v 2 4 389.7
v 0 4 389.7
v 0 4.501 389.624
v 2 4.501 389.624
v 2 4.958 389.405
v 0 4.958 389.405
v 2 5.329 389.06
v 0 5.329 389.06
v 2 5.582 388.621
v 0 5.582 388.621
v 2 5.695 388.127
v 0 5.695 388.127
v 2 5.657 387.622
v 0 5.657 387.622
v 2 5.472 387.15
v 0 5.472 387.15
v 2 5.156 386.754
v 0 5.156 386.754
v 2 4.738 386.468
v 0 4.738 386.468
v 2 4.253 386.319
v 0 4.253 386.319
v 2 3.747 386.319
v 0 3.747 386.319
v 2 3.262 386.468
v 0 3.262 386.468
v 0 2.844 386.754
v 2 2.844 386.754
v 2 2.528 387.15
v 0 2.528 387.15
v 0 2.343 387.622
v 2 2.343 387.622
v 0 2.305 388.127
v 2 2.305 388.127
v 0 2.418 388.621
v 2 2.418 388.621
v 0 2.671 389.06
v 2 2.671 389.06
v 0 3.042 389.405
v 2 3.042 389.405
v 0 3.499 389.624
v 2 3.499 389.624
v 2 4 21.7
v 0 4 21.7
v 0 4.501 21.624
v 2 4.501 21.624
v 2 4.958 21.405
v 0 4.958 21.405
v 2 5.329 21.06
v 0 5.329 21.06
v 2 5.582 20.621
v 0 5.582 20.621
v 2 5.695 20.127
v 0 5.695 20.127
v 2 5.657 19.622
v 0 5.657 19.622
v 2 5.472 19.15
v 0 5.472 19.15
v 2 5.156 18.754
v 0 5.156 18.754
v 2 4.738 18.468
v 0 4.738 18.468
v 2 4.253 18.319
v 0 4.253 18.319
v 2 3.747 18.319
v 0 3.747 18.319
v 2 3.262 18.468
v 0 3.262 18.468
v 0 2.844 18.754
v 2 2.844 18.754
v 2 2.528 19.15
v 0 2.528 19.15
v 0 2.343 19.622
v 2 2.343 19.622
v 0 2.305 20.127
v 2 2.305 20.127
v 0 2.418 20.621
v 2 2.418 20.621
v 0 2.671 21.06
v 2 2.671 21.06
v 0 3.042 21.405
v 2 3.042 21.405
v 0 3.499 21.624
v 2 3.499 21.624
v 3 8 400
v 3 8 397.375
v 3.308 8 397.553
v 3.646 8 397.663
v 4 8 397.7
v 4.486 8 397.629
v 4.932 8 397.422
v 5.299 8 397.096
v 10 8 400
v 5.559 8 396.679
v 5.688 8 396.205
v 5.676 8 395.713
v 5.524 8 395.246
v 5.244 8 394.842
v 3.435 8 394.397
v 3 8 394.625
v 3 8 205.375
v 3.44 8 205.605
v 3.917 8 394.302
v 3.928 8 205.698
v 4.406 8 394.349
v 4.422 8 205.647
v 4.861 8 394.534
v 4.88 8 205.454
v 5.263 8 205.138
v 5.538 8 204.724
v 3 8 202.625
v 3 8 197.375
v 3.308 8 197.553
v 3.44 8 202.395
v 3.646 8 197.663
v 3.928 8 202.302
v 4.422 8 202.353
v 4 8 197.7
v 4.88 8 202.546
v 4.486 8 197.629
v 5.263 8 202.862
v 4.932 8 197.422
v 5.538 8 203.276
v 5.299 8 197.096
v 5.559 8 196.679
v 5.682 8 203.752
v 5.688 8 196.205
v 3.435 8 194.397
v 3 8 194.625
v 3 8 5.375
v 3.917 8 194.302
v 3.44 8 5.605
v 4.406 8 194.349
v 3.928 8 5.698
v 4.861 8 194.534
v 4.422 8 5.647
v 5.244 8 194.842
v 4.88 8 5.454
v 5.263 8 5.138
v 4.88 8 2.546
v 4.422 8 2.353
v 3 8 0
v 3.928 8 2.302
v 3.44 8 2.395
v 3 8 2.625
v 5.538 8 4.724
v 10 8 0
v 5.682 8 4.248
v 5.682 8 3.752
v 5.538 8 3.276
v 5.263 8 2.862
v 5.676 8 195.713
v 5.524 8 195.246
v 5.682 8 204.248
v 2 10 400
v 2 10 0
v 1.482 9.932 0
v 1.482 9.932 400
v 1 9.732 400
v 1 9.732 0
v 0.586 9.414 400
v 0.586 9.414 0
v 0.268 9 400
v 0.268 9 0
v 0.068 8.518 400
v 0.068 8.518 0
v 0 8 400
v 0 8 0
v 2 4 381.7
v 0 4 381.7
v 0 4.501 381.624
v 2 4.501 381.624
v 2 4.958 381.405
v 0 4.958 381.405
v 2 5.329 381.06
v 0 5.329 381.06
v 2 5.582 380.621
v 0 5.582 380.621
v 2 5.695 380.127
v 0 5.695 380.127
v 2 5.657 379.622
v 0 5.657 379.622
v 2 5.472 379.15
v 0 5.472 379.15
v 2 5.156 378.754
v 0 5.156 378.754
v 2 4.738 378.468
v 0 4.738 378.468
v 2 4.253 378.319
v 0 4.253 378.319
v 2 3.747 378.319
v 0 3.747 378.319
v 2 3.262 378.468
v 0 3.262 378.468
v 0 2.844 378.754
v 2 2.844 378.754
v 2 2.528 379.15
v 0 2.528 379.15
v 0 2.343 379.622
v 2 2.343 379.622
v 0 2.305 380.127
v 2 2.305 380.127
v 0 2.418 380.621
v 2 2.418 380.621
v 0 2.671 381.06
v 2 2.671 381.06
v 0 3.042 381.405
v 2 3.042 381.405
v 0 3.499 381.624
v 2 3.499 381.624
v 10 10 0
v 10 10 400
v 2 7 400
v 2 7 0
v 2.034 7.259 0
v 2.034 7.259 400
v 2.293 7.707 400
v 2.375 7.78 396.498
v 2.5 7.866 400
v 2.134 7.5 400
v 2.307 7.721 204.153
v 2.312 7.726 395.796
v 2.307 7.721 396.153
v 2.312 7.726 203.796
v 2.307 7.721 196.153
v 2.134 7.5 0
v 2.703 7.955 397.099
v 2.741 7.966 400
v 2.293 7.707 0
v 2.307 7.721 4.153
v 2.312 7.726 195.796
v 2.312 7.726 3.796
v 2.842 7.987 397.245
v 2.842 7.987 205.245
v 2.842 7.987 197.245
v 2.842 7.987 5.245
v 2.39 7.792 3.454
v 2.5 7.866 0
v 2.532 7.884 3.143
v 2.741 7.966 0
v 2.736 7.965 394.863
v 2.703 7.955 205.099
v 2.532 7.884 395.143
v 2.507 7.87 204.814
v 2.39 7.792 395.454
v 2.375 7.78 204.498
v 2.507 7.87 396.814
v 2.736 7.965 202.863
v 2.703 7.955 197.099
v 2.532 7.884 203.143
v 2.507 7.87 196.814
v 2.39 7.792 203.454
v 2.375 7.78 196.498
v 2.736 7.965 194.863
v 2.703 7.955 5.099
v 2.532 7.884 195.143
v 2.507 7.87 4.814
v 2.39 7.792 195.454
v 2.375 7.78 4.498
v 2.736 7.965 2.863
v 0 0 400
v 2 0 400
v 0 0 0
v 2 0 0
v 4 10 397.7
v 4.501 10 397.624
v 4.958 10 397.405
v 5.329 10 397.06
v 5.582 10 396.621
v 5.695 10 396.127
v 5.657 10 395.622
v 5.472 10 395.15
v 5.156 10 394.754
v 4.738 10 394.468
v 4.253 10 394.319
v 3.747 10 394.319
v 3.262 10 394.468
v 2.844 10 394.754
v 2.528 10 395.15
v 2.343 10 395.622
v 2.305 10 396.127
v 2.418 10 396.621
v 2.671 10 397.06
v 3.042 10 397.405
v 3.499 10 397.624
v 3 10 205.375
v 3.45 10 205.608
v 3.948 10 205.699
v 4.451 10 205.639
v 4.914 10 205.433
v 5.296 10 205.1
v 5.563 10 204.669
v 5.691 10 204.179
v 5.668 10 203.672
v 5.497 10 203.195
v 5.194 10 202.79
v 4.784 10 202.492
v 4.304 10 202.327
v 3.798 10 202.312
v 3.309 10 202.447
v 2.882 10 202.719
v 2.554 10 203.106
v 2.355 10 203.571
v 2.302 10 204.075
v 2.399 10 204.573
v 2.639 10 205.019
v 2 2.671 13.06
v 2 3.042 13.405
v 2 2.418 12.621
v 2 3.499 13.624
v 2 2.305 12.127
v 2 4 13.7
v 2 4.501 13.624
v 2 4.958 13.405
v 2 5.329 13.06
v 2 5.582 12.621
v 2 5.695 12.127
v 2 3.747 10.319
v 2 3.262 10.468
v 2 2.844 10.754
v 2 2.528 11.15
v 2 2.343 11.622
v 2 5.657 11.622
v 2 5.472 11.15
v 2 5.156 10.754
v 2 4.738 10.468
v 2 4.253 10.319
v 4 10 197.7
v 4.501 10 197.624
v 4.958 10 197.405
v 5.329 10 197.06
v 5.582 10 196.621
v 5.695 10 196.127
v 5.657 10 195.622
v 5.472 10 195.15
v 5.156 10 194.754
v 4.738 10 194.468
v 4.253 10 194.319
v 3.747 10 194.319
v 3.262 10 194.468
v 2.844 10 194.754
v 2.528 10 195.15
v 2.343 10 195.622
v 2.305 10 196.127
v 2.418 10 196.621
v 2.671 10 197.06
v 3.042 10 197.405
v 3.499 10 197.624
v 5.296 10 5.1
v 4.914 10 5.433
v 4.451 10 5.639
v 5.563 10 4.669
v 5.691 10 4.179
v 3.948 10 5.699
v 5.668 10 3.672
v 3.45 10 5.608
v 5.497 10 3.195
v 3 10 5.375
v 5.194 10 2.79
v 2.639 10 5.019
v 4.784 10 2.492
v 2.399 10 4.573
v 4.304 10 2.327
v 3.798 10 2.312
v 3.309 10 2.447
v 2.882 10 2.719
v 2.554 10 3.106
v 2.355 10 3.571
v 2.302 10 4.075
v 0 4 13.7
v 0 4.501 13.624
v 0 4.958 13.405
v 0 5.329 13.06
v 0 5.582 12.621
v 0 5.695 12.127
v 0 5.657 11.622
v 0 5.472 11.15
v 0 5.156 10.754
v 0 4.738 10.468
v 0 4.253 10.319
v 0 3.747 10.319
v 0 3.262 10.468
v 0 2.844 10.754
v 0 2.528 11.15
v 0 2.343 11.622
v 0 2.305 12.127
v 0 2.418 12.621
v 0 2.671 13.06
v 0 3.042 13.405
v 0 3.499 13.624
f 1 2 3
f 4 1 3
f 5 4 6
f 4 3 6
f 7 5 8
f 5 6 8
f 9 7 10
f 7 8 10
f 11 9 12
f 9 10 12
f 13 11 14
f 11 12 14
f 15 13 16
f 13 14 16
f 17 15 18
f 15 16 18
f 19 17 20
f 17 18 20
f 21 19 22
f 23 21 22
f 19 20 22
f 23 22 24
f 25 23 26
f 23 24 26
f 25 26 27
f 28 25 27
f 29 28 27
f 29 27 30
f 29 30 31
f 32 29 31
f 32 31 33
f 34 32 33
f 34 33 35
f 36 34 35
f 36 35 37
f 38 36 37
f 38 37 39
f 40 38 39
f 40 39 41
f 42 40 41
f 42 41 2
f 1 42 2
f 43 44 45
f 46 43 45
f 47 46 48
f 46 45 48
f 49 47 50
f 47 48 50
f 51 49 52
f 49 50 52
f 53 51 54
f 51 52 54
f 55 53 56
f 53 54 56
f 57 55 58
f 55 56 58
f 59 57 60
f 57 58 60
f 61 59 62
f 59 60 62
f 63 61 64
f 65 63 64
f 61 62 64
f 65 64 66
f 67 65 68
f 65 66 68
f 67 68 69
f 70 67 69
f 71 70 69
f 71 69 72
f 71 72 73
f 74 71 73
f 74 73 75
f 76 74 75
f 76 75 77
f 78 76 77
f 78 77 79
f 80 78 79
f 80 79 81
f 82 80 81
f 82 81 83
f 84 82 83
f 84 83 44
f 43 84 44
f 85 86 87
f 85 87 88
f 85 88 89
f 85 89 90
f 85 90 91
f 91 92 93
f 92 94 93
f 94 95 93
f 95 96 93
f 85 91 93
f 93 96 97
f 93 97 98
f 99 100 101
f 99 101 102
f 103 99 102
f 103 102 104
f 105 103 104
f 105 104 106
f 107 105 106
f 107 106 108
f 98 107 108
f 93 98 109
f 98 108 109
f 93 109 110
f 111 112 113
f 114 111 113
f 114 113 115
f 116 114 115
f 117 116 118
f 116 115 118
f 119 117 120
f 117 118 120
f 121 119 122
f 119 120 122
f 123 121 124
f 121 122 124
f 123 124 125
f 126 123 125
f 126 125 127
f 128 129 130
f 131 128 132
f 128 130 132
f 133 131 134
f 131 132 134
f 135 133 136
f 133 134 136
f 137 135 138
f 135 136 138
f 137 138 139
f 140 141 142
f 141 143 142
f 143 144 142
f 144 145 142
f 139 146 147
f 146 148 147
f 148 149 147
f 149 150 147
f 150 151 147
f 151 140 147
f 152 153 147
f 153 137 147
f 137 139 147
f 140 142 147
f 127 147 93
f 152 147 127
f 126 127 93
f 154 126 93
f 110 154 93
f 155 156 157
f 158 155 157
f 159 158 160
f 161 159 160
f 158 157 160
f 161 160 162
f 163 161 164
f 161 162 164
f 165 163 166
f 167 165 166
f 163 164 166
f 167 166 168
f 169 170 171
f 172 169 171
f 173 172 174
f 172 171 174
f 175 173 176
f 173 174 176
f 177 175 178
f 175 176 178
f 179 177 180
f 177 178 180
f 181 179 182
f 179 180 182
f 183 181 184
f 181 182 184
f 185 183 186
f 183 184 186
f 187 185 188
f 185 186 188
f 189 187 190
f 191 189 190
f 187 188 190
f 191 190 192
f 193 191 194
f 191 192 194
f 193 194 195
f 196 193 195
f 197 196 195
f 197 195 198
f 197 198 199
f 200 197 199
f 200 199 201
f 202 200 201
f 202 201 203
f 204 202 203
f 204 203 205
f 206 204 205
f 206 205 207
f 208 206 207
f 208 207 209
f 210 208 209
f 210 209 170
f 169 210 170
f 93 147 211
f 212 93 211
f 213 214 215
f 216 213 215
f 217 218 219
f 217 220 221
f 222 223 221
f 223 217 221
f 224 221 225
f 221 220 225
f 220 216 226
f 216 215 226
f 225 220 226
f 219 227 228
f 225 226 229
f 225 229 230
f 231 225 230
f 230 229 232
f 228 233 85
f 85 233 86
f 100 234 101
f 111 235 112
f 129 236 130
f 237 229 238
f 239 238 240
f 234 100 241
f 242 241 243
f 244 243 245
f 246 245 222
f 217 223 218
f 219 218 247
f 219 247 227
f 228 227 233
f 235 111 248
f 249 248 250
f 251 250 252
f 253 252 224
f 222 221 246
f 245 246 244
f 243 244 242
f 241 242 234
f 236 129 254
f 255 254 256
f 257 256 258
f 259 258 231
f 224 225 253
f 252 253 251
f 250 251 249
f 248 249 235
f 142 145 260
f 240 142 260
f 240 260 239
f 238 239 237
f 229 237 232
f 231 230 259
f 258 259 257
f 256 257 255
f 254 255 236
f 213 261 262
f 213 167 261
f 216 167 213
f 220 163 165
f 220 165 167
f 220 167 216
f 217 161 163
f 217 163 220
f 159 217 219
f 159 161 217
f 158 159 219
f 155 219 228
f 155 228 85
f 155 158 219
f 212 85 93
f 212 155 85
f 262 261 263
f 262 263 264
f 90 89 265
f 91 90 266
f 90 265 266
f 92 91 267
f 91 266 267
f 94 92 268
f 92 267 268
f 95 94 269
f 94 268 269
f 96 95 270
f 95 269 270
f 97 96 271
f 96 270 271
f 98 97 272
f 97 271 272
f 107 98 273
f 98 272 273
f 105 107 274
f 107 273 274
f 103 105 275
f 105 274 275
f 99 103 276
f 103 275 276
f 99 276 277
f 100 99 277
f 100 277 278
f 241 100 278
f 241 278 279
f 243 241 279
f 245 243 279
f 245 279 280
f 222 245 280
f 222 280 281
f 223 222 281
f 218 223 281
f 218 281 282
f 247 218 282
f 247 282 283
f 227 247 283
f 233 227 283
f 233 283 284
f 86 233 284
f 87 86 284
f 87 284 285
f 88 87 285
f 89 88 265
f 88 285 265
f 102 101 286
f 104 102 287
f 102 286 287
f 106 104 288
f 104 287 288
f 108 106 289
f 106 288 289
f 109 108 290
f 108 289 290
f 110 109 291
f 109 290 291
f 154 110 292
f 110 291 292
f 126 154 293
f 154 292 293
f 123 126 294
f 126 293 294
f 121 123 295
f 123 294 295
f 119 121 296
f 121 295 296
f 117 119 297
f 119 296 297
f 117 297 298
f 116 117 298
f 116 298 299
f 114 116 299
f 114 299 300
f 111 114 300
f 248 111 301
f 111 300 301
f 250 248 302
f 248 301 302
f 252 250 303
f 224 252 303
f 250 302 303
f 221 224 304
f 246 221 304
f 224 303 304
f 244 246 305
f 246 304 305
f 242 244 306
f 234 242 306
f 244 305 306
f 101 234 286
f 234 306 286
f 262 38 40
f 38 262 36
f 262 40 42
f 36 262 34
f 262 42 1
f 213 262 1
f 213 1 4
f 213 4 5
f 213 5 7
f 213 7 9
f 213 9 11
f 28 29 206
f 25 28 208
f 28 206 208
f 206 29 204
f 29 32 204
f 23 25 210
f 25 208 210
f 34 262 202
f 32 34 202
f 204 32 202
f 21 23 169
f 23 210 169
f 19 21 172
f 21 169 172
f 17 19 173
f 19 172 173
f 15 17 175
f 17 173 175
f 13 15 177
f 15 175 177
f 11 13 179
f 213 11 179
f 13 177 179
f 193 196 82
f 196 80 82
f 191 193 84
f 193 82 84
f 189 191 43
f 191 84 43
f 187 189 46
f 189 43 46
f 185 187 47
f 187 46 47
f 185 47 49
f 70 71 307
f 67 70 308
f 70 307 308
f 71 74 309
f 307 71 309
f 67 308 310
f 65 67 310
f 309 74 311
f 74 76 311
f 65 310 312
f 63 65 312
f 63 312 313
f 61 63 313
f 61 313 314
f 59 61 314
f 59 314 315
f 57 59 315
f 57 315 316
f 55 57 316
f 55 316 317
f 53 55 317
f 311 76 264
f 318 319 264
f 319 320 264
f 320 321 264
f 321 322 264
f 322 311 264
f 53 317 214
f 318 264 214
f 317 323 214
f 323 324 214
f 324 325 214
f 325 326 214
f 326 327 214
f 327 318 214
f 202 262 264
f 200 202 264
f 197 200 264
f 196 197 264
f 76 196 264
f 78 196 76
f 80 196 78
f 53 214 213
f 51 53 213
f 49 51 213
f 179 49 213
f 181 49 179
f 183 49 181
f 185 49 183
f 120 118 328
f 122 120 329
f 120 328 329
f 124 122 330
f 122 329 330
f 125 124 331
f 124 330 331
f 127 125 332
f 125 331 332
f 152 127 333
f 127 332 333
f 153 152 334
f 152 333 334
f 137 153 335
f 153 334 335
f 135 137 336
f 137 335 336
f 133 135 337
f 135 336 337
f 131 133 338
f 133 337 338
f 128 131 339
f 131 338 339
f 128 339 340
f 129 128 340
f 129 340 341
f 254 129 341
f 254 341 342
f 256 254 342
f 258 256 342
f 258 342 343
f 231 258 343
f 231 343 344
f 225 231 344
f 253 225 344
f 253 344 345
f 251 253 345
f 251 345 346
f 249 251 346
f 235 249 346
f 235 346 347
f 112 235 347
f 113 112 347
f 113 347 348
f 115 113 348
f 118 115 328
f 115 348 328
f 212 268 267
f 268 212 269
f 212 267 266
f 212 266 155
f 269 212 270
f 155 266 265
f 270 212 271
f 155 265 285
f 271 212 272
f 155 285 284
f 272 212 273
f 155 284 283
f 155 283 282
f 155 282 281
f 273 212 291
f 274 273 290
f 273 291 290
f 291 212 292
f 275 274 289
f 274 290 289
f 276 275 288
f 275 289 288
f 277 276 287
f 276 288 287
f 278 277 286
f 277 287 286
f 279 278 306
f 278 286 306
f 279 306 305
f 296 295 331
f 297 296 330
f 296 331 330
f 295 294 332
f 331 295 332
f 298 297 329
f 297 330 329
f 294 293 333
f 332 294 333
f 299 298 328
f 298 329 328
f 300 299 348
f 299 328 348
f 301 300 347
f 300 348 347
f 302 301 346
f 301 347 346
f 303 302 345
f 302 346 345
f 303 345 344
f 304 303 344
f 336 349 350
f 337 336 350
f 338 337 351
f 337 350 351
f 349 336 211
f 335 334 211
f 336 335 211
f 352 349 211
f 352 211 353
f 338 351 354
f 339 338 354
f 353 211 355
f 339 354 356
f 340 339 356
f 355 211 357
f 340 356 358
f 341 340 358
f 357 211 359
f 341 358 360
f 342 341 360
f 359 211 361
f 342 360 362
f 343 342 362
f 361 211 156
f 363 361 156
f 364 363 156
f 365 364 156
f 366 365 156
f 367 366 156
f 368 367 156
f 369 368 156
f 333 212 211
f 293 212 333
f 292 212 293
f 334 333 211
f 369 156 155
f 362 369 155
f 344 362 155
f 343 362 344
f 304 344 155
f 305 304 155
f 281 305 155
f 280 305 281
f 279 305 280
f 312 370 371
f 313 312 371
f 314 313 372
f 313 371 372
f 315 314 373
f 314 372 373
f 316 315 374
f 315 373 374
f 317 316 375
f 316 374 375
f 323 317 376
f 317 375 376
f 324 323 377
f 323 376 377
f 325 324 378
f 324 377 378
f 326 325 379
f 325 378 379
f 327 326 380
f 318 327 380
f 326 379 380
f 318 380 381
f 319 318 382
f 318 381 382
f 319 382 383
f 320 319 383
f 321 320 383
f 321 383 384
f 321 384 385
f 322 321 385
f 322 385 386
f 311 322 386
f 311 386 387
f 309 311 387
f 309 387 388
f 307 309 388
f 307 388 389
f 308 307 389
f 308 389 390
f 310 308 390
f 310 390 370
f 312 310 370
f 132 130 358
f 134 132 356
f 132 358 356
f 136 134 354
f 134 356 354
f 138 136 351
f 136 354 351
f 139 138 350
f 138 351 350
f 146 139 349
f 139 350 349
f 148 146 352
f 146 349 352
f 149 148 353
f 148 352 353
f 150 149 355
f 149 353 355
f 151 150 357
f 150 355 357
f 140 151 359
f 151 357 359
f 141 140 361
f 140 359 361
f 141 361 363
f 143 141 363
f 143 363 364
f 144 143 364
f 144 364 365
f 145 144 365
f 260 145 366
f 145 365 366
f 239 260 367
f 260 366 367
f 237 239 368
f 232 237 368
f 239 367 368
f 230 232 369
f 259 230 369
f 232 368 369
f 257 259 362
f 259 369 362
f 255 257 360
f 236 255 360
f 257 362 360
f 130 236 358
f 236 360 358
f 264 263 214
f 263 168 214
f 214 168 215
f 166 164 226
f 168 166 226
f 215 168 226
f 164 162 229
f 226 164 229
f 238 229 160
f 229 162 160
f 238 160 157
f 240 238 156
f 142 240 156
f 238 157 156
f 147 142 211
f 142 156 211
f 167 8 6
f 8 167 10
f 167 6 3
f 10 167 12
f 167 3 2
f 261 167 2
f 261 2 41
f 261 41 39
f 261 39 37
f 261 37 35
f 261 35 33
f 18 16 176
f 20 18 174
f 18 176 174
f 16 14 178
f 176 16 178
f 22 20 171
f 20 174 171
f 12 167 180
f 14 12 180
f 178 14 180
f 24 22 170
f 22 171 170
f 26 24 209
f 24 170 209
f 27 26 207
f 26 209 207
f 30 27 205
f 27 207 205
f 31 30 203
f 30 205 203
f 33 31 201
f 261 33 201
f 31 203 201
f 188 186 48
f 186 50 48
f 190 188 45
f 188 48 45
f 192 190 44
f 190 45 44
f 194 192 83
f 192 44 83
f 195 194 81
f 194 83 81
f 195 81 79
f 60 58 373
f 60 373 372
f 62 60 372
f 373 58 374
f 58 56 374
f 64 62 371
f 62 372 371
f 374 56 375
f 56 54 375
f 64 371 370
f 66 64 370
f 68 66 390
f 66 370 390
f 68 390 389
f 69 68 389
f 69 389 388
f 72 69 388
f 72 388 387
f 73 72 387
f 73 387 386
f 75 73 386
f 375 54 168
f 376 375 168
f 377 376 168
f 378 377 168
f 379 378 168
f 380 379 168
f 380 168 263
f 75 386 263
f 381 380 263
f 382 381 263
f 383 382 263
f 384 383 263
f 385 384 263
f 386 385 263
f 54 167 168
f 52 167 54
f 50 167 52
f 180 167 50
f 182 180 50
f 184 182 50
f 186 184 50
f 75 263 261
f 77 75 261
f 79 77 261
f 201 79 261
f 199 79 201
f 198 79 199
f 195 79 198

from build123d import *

# Parameters (mm, degrees)
EXTRUDE_1_DEPTH     = 400
SKETCH_2_R          = 1.7
CUT_EXTRUDE_1_DEPTH = 5
SKETCH_3_R          = 1.7
CUT_EXTRUDE_2_DEPTH = 5


with BuildPart() as part:
    # Эскиз1 → Вытянуть1 (new body)
    with BuildSketch(Plane.XY):
        with BuildLine():
            Line((0, 0), (2, 0))
            Line((2, 0), (2, 7))
            ThreePointArc((2, 7), (2.292893219, 7.707106781), (3, 8))
            Line((3, 8), (10, 8))
            Line((10, 8), (10, 10))
            Line((10, 10), (2, 10))
            ThreePointArc((2, 10), (0.585786438, 9.414213562), (0, 8))
            Line((0, 8), (0, 0))
        make_face()
    extrude(amount=EXTRUDE_1_DEPTH)

    # Эскиз2 → Вырез-Вытянуть1 (cut)
    with BuildSketch(Plane(origin=(0, 10, 0), x_dir=(-1, 0, 0), z_dir=(0, 1, 0))):
        with Locations(Location((-4, 396, 0), (0, 0, 90))):
            Circle(SKETCH_2_R)
        with Locations(Location((-4, 4, 0), (0, 0, 53.968120928))):
            Circle(SKETCH_2_R)
        with Locations(Location((-4, 204, 0), (0, 0, 53.968120928))):
            Circle(SKETCH_2_R)
        with Locations(Location((-4, 196, 0), (0, 0, 90))):
            Circle(SKETCH_2_R)
    extrude(amount=-CUT_EXTRUDE_1_DEPTH, mode=Mode.SUBTRACT)

    # Эскиз3 → Вырез-Вытянуть2 (cut)
    with BuildSketch(Plane.ZY):
        with Locations((388, 4)):
            Circle(SKETCH_3_R)
        with Locations((380, 4)):
            Circle(SKETCH_3_R)
        with Locations((20, 4)):
            Circle(SKETCH_3_R)
        with Locations((12, 4)):
            Circle(SKETCH_3_R)
    extrude(amount=-CUT_EXTRUDE_2_DEPTH, mode=Mode.SUBTRACT)


solid = part.part
